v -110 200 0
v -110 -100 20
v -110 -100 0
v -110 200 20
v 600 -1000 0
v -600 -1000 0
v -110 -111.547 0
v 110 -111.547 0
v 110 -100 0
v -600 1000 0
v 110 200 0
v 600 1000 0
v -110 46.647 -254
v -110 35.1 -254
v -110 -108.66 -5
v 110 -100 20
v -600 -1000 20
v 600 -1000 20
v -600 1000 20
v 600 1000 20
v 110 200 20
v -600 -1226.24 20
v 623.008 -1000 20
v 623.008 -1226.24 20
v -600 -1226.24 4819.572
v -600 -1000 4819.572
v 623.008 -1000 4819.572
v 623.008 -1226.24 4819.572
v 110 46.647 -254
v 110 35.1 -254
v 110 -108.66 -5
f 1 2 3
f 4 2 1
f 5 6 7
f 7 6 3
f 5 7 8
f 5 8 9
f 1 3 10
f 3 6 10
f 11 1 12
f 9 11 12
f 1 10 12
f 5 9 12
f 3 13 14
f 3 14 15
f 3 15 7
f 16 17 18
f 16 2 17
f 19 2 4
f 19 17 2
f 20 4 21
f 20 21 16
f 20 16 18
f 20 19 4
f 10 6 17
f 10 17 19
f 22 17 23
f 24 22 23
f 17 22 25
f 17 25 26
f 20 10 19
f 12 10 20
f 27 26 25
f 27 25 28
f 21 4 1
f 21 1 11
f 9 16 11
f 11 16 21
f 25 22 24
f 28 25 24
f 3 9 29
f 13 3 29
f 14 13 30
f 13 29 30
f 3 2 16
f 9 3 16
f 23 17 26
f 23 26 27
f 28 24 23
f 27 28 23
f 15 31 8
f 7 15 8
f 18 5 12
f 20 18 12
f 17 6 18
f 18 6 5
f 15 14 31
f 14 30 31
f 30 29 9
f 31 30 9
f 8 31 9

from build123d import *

# Parameters (mm, degrees)
SKETCH1_W           = 1200
SKETCH1_H           = 2000
BOSS_EXTRUDE1_DEPTH = 20
SKETCH3_W           = 220
SKETCH3_H           = 300
CUT_EXTRUDE1_DEPTH  = 21
BOSS_EXTRUDE2_DEPTH = 110
SKETCH7_W           = 1223.00766722
SKETCH7_H           = 226.240360044
BOSS_EXTRUDE3_DEPTH = 4799.571529182


with BuildPart() as part:
    # Sketch1 → Boss-Extrude1 (new body)
    with BuildSketch(Plane.XY):
        Rectangle(SKETCH1_W, SKETCH1_H)
    extrude(amount=BOSS_EXTRUDE1_DEPTH)

    # Sketch3 → Cut-Extrude1 (cut, through all)
    with BuildSketch(Plane.XY.offset(20)):
        with Locations((0, 50)):
            Rectangle(SKETCH3_W, SKETCH3_H)
    extrude(amount=-CUT_EXTRUDE1_DEPTH, mode=Mode.SUBTRACT)

    # Sketch4 → Boss-Extrude2 (add, symmetric)
    with BuildSketch(Plane(origin=(0, 0, 0), x_dir=(0, 0, -1), z_dir=(1, 0, 0))):
        Polygon((0, -100), (254, 46.646968374), (254, 35.09996299), (5, -108.660254038), (0, -111.547005384), align=None)
    extrude(amount=BOSS_EXTRUDE2_DEPTH, both=True)


with BuildPart() as body_2:
    # Sketch7 → Boss-Extrude3 (new body)
    with BuildSketch(Plane.XY.offset(20)):
        with Locations((11.50383361, -1113.120180022)):
            Rectangle(SKETCH7_W, SKETCH7_H)
    extrude(amount=BOSS_EXTRUDE3_DEPTH)


solid = Compound([part.part, body_2.part])
